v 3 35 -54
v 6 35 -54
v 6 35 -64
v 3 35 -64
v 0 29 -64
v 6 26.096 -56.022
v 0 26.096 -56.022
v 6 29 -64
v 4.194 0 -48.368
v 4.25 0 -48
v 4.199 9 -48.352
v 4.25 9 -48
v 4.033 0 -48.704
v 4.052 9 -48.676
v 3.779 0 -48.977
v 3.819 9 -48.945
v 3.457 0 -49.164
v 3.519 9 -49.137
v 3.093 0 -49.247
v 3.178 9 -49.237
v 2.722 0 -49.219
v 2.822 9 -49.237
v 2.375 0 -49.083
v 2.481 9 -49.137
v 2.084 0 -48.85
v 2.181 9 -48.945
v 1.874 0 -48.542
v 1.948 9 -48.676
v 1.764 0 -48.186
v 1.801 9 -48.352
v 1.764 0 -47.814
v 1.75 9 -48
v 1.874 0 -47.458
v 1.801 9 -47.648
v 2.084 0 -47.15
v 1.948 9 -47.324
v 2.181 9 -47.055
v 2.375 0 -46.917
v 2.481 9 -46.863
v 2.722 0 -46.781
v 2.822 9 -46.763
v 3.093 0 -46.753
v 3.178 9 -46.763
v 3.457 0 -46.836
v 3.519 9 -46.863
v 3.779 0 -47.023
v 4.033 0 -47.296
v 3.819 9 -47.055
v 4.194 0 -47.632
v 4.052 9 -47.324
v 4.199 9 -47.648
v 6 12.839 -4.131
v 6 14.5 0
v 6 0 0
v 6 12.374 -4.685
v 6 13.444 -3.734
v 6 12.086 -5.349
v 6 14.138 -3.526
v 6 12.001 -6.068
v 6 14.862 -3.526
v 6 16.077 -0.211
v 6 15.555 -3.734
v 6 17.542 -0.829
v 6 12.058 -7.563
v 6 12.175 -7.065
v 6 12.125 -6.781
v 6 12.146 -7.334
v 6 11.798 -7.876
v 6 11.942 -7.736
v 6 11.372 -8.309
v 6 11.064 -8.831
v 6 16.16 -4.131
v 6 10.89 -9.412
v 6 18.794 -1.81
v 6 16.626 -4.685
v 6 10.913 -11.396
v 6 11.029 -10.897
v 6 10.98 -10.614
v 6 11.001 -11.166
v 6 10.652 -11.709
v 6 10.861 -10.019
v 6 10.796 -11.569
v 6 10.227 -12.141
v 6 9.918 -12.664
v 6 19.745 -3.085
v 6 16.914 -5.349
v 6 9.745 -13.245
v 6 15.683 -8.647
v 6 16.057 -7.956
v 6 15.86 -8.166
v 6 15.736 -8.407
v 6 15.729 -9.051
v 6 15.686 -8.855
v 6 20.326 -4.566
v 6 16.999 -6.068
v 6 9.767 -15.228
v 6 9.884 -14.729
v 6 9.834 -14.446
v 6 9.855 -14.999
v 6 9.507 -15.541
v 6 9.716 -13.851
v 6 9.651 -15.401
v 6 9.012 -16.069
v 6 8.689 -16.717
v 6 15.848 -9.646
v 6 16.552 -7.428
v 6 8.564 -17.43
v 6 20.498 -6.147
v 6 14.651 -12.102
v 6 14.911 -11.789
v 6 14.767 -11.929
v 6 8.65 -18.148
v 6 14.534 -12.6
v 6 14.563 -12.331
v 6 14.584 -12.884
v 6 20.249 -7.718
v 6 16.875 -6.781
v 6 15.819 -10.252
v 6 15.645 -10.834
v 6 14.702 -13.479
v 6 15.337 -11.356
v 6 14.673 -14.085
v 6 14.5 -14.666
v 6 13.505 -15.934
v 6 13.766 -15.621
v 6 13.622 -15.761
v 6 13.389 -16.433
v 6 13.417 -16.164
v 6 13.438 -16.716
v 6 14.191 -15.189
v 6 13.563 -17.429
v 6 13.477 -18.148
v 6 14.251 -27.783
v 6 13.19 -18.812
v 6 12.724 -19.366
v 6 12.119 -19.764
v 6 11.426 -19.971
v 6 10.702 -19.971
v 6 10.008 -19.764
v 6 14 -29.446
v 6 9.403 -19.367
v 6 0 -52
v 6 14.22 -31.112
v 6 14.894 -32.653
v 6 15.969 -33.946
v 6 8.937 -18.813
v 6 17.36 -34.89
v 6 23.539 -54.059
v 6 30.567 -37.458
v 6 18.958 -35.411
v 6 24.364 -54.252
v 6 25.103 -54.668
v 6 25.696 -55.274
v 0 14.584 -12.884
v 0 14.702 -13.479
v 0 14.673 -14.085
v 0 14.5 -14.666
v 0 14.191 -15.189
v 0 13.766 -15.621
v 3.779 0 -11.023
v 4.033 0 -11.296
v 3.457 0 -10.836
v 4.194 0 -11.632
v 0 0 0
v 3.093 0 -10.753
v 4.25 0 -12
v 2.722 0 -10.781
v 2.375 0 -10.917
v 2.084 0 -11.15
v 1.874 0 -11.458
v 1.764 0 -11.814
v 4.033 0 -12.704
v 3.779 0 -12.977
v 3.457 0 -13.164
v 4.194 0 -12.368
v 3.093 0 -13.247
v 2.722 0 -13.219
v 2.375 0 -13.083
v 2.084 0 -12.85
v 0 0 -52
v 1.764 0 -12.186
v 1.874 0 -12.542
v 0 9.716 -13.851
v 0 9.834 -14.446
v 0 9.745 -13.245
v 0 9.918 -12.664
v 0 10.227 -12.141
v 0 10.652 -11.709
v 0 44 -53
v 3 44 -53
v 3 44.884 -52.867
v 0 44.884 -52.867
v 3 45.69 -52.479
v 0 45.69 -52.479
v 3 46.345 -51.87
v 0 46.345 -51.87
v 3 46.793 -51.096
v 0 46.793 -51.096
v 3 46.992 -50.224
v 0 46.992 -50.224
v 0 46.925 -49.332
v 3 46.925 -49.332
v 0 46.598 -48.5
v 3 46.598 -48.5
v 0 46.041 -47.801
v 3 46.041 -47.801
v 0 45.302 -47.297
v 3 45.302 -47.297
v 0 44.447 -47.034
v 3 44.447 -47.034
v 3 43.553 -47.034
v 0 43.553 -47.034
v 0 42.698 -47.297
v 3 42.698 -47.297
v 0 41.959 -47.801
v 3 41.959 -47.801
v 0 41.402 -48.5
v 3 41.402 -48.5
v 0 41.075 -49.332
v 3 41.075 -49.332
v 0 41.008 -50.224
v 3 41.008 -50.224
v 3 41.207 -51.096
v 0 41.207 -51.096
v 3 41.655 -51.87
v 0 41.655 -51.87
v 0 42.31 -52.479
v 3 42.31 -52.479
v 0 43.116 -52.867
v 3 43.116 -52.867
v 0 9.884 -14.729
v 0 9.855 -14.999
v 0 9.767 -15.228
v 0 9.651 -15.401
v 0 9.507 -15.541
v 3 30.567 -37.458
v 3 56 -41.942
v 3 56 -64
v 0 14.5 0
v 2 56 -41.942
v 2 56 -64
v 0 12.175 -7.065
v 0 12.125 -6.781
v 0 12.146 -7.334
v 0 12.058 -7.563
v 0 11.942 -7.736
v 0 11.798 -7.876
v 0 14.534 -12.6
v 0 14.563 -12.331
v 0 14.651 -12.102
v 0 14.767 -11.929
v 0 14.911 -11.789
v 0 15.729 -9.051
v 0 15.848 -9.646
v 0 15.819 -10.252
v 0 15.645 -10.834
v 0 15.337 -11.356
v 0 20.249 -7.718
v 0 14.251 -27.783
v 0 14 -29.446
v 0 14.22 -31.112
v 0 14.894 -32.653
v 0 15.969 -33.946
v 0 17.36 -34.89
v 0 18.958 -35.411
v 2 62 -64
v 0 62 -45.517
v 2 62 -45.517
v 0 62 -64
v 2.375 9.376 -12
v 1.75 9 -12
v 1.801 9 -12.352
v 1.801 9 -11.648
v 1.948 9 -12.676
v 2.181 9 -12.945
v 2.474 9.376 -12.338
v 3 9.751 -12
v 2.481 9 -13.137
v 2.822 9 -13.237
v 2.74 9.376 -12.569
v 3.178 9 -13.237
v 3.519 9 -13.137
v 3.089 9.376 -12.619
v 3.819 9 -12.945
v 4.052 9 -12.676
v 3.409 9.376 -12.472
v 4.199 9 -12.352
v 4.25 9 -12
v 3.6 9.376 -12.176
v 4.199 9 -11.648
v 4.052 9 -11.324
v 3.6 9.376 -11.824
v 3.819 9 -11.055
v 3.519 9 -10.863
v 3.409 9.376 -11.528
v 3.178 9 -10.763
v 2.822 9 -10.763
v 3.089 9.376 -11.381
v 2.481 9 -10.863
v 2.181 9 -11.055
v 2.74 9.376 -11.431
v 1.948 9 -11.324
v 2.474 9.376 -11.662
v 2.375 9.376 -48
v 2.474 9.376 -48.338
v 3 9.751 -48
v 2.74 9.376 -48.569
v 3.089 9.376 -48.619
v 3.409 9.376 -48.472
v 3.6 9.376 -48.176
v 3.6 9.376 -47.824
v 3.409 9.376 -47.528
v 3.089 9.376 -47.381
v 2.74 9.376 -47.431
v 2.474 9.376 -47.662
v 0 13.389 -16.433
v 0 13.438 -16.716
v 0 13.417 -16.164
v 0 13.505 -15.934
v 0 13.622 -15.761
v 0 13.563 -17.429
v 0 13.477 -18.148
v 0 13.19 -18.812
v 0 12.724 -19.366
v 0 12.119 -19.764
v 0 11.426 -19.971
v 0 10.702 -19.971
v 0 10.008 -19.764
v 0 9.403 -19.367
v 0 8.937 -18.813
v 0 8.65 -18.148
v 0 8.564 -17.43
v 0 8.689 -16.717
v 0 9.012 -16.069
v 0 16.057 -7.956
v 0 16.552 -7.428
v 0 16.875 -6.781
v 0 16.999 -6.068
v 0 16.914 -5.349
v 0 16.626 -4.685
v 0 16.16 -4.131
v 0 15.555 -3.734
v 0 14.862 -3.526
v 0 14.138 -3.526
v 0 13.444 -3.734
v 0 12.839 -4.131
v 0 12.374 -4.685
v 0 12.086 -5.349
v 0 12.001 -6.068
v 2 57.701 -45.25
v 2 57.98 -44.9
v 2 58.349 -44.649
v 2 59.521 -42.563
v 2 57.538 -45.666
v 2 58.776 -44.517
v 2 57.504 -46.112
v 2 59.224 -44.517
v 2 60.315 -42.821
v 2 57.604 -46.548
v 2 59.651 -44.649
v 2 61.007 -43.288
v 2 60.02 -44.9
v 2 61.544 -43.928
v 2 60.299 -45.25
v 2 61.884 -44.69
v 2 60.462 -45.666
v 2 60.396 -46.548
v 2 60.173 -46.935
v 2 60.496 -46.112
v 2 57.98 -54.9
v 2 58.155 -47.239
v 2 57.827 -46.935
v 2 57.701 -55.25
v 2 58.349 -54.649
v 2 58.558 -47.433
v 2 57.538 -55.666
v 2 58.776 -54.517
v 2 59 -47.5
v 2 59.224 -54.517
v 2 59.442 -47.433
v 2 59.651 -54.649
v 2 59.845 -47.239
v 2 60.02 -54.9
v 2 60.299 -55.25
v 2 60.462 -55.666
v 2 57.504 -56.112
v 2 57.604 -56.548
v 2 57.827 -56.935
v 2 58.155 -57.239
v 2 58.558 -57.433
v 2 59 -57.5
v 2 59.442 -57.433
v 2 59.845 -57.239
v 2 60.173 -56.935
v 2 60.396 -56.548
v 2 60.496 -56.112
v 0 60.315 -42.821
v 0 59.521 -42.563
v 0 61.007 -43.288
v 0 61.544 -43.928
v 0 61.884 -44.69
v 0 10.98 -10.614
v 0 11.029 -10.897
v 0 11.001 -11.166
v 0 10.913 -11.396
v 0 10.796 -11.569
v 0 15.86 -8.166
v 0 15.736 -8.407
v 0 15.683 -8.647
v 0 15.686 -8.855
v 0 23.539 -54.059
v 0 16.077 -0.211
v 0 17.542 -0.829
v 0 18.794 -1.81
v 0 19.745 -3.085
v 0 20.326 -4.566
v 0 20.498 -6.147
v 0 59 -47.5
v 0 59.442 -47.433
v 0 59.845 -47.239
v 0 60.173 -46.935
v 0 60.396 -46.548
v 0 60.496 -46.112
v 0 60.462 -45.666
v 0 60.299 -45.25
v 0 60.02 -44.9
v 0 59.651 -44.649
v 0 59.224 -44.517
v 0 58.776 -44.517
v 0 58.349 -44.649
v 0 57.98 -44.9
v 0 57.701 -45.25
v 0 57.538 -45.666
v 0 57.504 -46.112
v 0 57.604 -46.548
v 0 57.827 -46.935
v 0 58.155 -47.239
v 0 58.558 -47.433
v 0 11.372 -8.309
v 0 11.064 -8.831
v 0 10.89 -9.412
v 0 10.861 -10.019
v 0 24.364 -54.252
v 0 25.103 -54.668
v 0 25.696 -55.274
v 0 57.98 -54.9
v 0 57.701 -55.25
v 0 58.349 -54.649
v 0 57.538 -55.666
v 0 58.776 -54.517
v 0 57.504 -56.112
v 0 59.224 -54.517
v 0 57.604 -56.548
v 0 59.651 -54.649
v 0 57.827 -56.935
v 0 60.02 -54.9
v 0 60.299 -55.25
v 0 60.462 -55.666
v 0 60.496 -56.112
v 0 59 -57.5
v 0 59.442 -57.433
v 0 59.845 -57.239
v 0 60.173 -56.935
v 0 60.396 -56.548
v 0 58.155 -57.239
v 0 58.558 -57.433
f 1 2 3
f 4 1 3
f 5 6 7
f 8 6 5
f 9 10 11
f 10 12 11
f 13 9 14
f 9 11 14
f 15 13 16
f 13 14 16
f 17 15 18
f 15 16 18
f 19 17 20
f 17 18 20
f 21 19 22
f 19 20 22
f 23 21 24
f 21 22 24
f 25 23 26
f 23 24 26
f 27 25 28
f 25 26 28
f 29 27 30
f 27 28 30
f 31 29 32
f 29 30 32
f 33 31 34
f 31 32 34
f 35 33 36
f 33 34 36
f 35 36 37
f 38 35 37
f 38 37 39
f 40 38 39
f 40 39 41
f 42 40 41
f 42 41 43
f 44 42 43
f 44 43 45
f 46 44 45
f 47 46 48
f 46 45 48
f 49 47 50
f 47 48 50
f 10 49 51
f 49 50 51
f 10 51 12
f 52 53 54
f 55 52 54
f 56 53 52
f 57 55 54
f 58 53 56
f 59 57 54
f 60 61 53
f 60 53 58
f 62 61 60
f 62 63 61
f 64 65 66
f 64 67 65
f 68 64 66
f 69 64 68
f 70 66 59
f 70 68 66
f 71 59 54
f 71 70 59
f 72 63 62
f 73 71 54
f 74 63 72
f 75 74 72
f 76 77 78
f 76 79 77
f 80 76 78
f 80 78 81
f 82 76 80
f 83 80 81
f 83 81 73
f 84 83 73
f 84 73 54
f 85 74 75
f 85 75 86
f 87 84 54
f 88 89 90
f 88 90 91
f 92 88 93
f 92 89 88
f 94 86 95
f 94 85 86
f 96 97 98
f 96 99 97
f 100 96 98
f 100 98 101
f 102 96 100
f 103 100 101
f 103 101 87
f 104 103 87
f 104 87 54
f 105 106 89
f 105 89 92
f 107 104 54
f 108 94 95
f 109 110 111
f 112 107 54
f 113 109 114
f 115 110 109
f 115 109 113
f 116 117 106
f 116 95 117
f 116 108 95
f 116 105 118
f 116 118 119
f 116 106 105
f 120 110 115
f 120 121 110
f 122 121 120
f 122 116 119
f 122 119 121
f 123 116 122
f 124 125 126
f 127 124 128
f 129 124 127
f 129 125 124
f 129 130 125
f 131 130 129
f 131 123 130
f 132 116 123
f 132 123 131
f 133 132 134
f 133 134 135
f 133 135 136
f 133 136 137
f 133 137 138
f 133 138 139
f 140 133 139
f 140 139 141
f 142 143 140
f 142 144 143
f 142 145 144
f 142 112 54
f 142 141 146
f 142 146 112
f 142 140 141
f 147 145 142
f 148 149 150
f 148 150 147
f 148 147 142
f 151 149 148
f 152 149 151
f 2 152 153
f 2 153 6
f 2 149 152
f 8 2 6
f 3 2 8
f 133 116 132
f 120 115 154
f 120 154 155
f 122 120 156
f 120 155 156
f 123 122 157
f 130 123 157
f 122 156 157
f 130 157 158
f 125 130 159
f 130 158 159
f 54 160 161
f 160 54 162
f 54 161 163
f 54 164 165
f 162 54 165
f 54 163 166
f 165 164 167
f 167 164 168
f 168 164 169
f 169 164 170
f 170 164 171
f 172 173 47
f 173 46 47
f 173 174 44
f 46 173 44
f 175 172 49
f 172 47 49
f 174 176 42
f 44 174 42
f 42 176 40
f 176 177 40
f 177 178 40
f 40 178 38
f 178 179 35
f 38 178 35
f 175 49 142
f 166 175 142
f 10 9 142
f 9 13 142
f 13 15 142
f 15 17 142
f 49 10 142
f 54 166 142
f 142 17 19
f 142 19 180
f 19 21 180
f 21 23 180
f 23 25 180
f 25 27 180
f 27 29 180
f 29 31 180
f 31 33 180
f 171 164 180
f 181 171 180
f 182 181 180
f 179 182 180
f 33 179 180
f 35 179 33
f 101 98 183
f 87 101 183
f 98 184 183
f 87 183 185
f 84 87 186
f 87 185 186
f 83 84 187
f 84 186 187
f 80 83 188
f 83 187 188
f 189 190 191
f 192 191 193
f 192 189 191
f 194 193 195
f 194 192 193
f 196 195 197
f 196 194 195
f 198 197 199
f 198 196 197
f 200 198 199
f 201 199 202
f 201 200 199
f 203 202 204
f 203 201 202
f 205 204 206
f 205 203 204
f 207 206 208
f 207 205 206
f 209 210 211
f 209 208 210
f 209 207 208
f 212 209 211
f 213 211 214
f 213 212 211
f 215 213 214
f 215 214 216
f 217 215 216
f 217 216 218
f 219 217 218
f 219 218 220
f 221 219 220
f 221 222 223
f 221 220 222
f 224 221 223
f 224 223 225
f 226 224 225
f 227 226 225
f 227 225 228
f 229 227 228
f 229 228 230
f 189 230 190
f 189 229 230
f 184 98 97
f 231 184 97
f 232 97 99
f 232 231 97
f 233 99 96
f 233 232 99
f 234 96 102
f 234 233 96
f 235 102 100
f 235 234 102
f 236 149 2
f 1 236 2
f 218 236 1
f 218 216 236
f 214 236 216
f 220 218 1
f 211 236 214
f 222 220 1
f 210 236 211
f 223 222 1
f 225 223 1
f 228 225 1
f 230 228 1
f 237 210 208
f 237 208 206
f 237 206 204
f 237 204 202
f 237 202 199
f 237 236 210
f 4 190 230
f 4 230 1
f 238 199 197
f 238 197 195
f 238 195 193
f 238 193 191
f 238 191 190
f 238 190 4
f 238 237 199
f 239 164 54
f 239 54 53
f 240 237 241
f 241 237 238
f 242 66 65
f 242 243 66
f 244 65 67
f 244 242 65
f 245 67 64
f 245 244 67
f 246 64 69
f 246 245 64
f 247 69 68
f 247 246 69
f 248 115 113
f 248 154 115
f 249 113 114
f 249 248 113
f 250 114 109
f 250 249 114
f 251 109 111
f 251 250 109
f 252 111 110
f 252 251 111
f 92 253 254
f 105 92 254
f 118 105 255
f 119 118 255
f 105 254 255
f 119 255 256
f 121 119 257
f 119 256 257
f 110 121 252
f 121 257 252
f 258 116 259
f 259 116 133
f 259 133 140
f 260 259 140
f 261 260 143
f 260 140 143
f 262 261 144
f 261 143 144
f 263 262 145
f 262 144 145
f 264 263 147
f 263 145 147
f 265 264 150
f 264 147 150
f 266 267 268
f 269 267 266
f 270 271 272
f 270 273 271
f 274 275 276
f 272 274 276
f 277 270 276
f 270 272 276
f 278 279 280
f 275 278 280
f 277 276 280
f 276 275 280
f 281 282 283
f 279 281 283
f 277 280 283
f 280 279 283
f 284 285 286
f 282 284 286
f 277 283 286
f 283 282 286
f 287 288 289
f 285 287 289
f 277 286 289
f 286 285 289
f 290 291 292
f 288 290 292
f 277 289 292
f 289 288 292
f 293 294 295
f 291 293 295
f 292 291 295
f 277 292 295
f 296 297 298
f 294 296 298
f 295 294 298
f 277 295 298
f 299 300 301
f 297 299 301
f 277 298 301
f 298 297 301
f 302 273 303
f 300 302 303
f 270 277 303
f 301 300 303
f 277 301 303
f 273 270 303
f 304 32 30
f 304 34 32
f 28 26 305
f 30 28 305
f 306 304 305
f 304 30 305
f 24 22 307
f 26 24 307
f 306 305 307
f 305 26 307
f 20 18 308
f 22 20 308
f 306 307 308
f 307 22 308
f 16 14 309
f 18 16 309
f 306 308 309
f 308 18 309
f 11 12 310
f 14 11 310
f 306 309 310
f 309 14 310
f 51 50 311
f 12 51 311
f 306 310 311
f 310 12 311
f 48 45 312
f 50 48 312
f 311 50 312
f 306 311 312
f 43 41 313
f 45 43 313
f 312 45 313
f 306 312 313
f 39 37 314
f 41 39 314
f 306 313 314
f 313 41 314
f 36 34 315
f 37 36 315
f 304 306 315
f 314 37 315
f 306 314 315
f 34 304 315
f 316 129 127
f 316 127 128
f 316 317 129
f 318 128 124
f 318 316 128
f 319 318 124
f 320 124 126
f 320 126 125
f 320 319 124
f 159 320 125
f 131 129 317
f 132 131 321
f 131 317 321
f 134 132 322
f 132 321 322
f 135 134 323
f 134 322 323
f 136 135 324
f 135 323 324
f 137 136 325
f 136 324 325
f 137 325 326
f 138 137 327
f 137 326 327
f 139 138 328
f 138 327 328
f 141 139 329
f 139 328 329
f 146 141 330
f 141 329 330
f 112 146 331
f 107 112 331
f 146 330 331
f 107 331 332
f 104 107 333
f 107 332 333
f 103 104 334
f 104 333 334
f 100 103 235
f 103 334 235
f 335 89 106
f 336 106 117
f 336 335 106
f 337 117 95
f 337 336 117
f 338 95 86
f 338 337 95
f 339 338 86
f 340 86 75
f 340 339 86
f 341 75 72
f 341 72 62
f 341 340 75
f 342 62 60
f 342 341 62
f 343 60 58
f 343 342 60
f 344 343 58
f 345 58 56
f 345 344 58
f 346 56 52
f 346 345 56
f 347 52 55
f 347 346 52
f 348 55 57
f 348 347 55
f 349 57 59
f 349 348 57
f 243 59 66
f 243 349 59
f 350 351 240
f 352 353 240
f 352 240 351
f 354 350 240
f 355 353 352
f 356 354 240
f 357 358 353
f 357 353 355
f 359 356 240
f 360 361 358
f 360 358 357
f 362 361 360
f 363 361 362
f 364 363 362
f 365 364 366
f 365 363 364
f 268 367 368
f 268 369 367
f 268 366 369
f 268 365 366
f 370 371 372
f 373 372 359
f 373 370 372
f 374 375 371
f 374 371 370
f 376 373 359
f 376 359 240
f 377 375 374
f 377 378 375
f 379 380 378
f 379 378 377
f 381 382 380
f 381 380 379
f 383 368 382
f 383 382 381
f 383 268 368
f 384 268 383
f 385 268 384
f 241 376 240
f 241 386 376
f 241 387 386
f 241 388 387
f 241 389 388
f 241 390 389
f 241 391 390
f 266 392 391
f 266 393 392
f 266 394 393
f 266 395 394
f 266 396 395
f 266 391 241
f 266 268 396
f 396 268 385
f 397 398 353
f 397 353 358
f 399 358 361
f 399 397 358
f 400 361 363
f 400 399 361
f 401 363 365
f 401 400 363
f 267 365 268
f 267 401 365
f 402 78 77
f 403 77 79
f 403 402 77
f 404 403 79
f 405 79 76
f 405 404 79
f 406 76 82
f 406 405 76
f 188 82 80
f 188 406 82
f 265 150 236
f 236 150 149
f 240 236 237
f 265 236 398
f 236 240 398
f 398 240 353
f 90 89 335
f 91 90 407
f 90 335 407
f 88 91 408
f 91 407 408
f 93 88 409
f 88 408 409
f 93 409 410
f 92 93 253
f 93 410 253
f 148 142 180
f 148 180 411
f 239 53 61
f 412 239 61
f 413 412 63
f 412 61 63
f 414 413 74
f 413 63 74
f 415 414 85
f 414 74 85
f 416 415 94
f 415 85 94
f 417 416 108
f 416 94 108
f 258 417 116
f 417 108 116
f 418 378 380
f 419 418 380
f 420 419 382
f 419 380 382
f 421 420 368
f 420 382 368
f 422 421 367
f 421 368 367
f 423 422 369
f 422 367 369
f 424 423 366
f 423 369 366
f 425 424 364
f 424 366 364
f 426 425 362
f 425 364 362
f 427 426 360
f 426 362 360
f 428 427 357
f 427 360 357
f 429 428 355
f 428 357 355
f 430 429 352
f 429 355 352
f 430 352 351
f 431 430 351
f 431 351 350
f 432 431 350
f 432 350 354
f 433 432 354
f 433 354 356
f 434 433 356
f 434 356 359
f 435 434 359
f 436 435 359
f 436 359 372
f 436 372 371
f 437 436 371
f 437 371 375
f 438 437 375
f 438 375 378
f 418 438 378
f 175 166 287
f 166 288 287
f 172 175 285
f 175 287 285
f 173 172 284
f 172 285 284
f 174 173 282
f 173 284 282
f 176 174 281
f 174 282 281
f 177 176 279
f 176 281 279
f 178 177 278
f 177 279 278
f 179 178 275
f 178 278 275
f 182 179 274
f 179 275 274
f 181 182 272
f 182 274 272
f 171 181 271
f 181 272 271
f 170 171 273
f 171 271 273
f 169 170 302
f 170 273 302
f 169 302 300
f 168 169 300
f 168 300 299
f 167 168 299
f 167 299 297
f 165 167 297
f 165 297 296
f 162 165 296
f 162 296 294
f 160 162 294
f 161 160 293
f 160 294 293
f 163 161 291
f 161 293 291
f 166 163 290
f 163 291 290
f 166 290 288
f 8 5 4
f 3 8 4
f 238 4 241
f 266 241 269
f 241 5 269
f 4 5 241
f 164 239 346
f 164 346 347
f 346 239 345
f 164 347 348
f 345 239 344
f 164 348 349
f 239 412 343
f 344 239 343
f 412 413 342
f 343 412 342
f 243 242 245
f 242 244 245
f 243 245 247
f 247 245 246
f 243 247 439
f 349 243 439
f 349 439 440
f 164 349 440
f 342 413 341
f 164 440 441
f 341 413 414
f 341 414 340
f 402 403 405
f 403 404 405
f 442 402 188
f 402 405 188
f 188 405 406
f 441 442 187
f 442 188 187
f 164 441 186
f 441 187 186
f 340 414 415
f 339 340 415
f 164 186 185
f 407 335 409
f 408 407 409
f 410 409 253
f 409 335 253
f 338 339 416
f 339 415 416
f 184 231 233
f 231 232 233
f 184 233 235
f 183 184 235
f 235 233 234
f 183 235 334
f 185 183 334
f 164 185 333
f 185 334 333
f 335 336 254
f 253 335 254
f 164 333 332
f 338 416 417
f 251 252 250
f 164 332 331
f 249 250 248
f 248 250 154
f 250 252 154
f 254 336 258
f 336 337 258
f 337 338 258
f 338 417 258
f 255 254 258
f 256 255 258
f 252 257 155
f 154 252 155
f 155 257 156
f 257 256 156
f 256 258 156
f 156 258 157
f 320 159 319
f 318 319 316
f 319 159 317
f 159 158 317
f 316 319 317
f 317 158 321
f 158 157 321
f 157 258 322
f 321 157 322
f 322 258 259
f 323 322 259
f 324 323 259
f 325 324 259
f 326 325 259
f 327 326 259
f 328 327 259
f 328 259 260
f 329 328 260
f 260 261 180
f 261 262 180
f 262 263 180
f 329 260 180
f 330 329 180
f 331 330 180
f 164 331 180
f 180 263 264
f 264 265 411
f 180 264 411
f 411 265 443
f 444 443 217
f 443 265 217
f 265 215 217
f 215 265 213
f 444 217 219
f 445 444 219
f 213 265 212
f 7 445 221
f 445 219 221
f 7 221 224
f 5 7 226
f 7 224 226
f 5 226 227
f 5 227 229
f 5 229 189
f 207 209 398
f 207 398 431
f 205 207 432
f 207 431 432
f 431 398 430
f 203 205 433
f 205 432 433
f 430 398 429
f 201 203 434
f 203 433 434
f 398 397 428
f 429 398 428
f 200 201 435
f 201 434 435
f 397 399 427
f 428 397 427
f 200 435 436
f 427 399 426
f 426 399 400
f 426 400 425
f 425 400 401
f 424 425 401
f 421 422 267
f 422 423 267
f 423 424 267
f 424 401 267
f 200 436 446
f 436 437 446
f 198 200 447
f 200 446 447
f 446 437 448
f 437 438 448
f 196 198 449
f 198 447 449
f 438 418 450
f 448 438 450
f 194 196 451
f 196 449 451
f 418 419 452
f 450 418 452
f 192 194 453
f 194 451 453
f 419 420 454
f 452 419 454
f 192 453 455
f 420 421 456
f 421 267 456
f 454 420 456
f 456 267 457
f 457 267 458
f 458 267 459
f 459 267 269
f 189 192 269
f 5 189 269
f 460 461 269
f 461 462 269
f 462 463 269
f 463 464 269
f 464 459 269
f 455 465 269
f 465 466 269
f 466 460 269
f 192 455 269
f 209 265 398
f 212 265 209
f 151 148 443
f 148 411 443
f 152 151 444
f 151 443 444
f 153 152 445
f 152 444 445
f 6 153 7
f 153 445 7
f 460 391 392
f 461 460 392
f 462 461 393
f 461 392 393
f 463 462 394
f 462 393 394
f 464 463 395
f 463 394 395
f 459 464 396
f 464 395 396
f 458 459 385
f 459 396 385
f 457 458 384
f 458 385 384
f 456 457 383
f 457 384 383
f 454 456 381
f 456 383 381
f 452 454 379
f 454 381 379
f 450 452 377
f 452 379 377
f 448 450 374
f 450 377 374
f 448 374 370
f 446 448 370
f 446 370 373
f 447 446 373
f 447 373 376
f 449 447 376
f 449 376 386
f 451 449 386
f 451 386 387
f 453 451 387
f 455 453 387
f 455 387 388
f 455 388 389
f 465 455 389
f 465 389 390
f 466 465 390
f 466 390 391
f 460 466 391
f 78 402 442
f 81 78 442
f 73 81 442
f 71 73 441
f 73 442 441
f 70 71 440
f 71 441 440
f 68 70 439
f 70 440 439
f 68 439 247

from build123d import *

# Parameters (mm, degrees)
SKETCH1_W                   = 64
SKETCH1_H                   = 62
SKETCH1_R                   = 2.5
SKETCH1_R_2                 = 3
BOSS_EXTRUDE1_DEPTH         = 6
CUT_EXTRUDE2_REACH          = 8
FILLET2_R                   = 3
TAP_DRILL_FOR_M3_TAP1_D     = 2.5
TAP_DRILL_FOR_M3_TAP1_DEPTH = 9
TAP_DRILL_FOR_M3_TAP1_TIP   = 0.751075774
CUT_EXTRUDE3_DEPTH          = 8
CUT_EXTRUDE4_DEPTH          = 3
FILLET3_R                   = 3
CUT_EXTRUDE5_REACH          = 5
SKETCH14_R                  = 1.5
SKETCH15_R                  = 2.5
CUT_EXTRUDE6_DEPTH          = 6
LPATTERN3_COUNT             = 3
LPATTERN3_PITCH             = 4
FILLET4_R                   = 1
SKETCH16_W                  = 22.057961884
SKETCH16_H                  = 6
CUT_EXTRUDE7_DEPTH          = 1


with BuildPart() as part:
    # Sketch1 → Boss-Extrude1 (new body)
    with BuildSketch(Plane(origin=(0, 0, 0), x_dir=(0, 0, -1), z_dir=(1, 0, 0))):
        with Locations((32, 31)):
            Rectangle(SKETCH1_W, SKETCH1_H)
        with Locations((6, 14.5)):
            Circle(SKETCH1_R, mode=Mode.SUBTRACT)
        with Locations((50, 44)):
            Circle(SKETCH1_R_2, mode=Mode.SUBTRACT)
    extrude(amount=BOSS_EXTRUDE1_DEPTH)

    # Sketch3 → Cut-Extrude2 (cut, up to next)
    with BuildSketch(Plane(origin=(6, 0, 0), x_dir=(0, 0, -1), z_dir=(1, 0, 0)), mode=Mode.PRIVATE) as cut_extrude2_sk1:
        Polygon((64, 0), (52, 0), (54.225932994, 25.442530542), (64, 29), align=None)
    cut_extrude2_tool1 = extrude(cut_extrude2_sk1.sketch, amount=-CUT_EXTRUDE2_REACH, mode=Mode.PRIVATE) & part.part
    add(cut_extrude2_tool1.solids().sort_by_distance((6, 13.1347, -58.667711))[0], mode=Mode.SUBTRACT)

    # Fillet2
    fillet2_edges = [part.edges().sort_by_distance(p)[0] for p in [
        (3, 25.442530542, -54.225932994),
    ]]
    fillet(fillet2_edges, radius=FILLET2_R)

    # Tap Drill for M3 Tap1
    with Locations(Plane(origin=(0, 0, 0), x_dir=(-1, 0, 0), z_dir=(0, -1, 0))):
        with Locations((-3, 48), (-3, 12)):
            Hole(TAP_DRILL_FOR_M3_TAP1_D / 2, depth=TAP_DRILL_FOR_M3_TAP1_DEPTH)
            with Locations((0, 0, -(TAP_DRILL_FOR_M3_TAP1_DEPTH + TAP_DRILL_FOR_M3_TAP1_TIP / 2))):  # 118° drill point
                Cone(0, TAP_DRILL_FOR_M3_TAP1_D / 2, TAP_DRILL_FOR_M3_TAP1_TIP, mode=Mode.SUBTRACT)

    # Sketch9 → Cut-Extrude3 (cut)
    with BuildSketch(Plane(origin=(6, 0, 0), x_dir=(0, 0, -1), z_dir=(1, 0, 0))):
        with BuildLine():
            Line((7.718264205, 20.248701429), (27.783442934, 14.251298571))
            ThreePointArc((27.783442934, 14.251298571), (32.652701535, 14.894000165), (35.410553657, 18.958110934))
            Line((35.410553657, 18.958110934), (43, 62))
            Line((43, 62), (0, 62))
            Line((0, 62), (0, 14.5))
            ThreePointArc((0, 14.5), (2.415978881, 19.311942707), (7.718264205, 20.248701429))
        make_face()
    extrude(amount=-CUT_EXTRUDE3_DEPTH, mode=Mode.SUBTRACT)

    # Sketch13 → Cut-Extrude4 (cut)
    with BuildSketch(Plane(origin=(6, 0, 0), x_dir=(0, 0, -1), z_dir=(1, 0, 0))):
        Polygon((54, 35), (64, 35), (64, 62), (43, 62), (37.457598082, 30.567476765), align=None)
    extrude(amount=-CUT_EXTRUDE4_DEPTH, mode=Mode.SUBTRACT)

    # Fillet3
    fillet3_edges = [part.edges().sort_by_distance(p)[0] for p in [
        (1.5, 62, -43),
    ]]
    fillet(fillet3_edges, radius=FILLET3_R)

    # Sketch14 → Cut-Extrude5 (cut, up to next)
    with BuildSketch(Plane(origin=(3, 0, 0), x_dir=(0, 0, -1), z_dir=(1, 0, 0)), mode=Mode.PRIVATE) as cut_extrude5_sk1:
        with Locations((56, 59)):
            Circle(SKETCH14_R)
    cut_extrude5_tool1 = extrude(cut_extrude5_sk1.sketch, amount=-CUT_EXTRUDE5_REACH, mode=Mode.PRIVATE) & part.part
    add(cut_extrude5_tool1.solids().sort_by_distance((3, 59, -56))[0], mode=Mode.SUBTRACT)
    # Sketch14 → Cut-Extrude5 (cut, up to next)
    with BuildSketch(Plane(origin=(3, 0, 0), x_dir=(0, 0, -1), z_dir=(1, 0, 0)), mode=Mode.PRIVATE) as cut_extrude5_sk2:
        with Locations((46, 59)):
            Circle(SKETCH14_R)
    cut_extrude5_tool2 = extrude(cut_extrude5_sk2.sketch, amount=-CUT_EXTRUDE5_REACH, mode=Mode.PRIVATE) & part.part
    add(cut_extrude5_tool2.solids().sort_by_distance((3, 59, -46))[0], mode=Mode.SUBTRACT)

    # Sketch15 → Cut-Extrude6 (cut)
    with BuildSketch(Plane.ZY):
        with Locations((-9.832467619, 13.35449053)):
            Circle(SKETCH15_R)
    cut_extrude6 = extrude(amount=-CUT_EXTRUDE6_DEPTH, mode=Mode.SUBTRACT)

    # LPattern3: Cut-Extrude6 ×3
    with Locations(*[Vector(0, -0.286377368, -0.958116905) * (i * LPATTERN3_PITCH) for i in range(1, LPATTERN3_COUNT)]):
        add(cut_extrude6, mode=Mode.SUBTRACT)

    # Fillet4
    fillet4_edges = [part.edges().sort_by_distance(p)[0] for p in [
        (3, 15.364420622, -8.345799861),
        (3, 12.490069908, -7.486667758),
        (3, 14.218911152, -12.17826748),
        (3, 11.344560437, -11.319135378),
        (3, 10.199050967, -15.151602997),
        (3, 13.073401682, -16.0107351),
    ]]
    fillet(fillet4_edges, radius=FILLET4_R)

    # Sketch16 → Cut-Extrude7 (cut)
    with BuildSketch(Plane(origin=(3, 0, 0), x_dir=(0, 0, -1), z_dir=(1, 0, 0))):
        with Locations((52.971019058, 59)):
            Rectangle(SKETCH16_W, SKETCH16_H)
    extrude(amount=-CUT_EXTRUDE7_DEPTH, mode=Mode.SUBTRACT)


solid = part.part
